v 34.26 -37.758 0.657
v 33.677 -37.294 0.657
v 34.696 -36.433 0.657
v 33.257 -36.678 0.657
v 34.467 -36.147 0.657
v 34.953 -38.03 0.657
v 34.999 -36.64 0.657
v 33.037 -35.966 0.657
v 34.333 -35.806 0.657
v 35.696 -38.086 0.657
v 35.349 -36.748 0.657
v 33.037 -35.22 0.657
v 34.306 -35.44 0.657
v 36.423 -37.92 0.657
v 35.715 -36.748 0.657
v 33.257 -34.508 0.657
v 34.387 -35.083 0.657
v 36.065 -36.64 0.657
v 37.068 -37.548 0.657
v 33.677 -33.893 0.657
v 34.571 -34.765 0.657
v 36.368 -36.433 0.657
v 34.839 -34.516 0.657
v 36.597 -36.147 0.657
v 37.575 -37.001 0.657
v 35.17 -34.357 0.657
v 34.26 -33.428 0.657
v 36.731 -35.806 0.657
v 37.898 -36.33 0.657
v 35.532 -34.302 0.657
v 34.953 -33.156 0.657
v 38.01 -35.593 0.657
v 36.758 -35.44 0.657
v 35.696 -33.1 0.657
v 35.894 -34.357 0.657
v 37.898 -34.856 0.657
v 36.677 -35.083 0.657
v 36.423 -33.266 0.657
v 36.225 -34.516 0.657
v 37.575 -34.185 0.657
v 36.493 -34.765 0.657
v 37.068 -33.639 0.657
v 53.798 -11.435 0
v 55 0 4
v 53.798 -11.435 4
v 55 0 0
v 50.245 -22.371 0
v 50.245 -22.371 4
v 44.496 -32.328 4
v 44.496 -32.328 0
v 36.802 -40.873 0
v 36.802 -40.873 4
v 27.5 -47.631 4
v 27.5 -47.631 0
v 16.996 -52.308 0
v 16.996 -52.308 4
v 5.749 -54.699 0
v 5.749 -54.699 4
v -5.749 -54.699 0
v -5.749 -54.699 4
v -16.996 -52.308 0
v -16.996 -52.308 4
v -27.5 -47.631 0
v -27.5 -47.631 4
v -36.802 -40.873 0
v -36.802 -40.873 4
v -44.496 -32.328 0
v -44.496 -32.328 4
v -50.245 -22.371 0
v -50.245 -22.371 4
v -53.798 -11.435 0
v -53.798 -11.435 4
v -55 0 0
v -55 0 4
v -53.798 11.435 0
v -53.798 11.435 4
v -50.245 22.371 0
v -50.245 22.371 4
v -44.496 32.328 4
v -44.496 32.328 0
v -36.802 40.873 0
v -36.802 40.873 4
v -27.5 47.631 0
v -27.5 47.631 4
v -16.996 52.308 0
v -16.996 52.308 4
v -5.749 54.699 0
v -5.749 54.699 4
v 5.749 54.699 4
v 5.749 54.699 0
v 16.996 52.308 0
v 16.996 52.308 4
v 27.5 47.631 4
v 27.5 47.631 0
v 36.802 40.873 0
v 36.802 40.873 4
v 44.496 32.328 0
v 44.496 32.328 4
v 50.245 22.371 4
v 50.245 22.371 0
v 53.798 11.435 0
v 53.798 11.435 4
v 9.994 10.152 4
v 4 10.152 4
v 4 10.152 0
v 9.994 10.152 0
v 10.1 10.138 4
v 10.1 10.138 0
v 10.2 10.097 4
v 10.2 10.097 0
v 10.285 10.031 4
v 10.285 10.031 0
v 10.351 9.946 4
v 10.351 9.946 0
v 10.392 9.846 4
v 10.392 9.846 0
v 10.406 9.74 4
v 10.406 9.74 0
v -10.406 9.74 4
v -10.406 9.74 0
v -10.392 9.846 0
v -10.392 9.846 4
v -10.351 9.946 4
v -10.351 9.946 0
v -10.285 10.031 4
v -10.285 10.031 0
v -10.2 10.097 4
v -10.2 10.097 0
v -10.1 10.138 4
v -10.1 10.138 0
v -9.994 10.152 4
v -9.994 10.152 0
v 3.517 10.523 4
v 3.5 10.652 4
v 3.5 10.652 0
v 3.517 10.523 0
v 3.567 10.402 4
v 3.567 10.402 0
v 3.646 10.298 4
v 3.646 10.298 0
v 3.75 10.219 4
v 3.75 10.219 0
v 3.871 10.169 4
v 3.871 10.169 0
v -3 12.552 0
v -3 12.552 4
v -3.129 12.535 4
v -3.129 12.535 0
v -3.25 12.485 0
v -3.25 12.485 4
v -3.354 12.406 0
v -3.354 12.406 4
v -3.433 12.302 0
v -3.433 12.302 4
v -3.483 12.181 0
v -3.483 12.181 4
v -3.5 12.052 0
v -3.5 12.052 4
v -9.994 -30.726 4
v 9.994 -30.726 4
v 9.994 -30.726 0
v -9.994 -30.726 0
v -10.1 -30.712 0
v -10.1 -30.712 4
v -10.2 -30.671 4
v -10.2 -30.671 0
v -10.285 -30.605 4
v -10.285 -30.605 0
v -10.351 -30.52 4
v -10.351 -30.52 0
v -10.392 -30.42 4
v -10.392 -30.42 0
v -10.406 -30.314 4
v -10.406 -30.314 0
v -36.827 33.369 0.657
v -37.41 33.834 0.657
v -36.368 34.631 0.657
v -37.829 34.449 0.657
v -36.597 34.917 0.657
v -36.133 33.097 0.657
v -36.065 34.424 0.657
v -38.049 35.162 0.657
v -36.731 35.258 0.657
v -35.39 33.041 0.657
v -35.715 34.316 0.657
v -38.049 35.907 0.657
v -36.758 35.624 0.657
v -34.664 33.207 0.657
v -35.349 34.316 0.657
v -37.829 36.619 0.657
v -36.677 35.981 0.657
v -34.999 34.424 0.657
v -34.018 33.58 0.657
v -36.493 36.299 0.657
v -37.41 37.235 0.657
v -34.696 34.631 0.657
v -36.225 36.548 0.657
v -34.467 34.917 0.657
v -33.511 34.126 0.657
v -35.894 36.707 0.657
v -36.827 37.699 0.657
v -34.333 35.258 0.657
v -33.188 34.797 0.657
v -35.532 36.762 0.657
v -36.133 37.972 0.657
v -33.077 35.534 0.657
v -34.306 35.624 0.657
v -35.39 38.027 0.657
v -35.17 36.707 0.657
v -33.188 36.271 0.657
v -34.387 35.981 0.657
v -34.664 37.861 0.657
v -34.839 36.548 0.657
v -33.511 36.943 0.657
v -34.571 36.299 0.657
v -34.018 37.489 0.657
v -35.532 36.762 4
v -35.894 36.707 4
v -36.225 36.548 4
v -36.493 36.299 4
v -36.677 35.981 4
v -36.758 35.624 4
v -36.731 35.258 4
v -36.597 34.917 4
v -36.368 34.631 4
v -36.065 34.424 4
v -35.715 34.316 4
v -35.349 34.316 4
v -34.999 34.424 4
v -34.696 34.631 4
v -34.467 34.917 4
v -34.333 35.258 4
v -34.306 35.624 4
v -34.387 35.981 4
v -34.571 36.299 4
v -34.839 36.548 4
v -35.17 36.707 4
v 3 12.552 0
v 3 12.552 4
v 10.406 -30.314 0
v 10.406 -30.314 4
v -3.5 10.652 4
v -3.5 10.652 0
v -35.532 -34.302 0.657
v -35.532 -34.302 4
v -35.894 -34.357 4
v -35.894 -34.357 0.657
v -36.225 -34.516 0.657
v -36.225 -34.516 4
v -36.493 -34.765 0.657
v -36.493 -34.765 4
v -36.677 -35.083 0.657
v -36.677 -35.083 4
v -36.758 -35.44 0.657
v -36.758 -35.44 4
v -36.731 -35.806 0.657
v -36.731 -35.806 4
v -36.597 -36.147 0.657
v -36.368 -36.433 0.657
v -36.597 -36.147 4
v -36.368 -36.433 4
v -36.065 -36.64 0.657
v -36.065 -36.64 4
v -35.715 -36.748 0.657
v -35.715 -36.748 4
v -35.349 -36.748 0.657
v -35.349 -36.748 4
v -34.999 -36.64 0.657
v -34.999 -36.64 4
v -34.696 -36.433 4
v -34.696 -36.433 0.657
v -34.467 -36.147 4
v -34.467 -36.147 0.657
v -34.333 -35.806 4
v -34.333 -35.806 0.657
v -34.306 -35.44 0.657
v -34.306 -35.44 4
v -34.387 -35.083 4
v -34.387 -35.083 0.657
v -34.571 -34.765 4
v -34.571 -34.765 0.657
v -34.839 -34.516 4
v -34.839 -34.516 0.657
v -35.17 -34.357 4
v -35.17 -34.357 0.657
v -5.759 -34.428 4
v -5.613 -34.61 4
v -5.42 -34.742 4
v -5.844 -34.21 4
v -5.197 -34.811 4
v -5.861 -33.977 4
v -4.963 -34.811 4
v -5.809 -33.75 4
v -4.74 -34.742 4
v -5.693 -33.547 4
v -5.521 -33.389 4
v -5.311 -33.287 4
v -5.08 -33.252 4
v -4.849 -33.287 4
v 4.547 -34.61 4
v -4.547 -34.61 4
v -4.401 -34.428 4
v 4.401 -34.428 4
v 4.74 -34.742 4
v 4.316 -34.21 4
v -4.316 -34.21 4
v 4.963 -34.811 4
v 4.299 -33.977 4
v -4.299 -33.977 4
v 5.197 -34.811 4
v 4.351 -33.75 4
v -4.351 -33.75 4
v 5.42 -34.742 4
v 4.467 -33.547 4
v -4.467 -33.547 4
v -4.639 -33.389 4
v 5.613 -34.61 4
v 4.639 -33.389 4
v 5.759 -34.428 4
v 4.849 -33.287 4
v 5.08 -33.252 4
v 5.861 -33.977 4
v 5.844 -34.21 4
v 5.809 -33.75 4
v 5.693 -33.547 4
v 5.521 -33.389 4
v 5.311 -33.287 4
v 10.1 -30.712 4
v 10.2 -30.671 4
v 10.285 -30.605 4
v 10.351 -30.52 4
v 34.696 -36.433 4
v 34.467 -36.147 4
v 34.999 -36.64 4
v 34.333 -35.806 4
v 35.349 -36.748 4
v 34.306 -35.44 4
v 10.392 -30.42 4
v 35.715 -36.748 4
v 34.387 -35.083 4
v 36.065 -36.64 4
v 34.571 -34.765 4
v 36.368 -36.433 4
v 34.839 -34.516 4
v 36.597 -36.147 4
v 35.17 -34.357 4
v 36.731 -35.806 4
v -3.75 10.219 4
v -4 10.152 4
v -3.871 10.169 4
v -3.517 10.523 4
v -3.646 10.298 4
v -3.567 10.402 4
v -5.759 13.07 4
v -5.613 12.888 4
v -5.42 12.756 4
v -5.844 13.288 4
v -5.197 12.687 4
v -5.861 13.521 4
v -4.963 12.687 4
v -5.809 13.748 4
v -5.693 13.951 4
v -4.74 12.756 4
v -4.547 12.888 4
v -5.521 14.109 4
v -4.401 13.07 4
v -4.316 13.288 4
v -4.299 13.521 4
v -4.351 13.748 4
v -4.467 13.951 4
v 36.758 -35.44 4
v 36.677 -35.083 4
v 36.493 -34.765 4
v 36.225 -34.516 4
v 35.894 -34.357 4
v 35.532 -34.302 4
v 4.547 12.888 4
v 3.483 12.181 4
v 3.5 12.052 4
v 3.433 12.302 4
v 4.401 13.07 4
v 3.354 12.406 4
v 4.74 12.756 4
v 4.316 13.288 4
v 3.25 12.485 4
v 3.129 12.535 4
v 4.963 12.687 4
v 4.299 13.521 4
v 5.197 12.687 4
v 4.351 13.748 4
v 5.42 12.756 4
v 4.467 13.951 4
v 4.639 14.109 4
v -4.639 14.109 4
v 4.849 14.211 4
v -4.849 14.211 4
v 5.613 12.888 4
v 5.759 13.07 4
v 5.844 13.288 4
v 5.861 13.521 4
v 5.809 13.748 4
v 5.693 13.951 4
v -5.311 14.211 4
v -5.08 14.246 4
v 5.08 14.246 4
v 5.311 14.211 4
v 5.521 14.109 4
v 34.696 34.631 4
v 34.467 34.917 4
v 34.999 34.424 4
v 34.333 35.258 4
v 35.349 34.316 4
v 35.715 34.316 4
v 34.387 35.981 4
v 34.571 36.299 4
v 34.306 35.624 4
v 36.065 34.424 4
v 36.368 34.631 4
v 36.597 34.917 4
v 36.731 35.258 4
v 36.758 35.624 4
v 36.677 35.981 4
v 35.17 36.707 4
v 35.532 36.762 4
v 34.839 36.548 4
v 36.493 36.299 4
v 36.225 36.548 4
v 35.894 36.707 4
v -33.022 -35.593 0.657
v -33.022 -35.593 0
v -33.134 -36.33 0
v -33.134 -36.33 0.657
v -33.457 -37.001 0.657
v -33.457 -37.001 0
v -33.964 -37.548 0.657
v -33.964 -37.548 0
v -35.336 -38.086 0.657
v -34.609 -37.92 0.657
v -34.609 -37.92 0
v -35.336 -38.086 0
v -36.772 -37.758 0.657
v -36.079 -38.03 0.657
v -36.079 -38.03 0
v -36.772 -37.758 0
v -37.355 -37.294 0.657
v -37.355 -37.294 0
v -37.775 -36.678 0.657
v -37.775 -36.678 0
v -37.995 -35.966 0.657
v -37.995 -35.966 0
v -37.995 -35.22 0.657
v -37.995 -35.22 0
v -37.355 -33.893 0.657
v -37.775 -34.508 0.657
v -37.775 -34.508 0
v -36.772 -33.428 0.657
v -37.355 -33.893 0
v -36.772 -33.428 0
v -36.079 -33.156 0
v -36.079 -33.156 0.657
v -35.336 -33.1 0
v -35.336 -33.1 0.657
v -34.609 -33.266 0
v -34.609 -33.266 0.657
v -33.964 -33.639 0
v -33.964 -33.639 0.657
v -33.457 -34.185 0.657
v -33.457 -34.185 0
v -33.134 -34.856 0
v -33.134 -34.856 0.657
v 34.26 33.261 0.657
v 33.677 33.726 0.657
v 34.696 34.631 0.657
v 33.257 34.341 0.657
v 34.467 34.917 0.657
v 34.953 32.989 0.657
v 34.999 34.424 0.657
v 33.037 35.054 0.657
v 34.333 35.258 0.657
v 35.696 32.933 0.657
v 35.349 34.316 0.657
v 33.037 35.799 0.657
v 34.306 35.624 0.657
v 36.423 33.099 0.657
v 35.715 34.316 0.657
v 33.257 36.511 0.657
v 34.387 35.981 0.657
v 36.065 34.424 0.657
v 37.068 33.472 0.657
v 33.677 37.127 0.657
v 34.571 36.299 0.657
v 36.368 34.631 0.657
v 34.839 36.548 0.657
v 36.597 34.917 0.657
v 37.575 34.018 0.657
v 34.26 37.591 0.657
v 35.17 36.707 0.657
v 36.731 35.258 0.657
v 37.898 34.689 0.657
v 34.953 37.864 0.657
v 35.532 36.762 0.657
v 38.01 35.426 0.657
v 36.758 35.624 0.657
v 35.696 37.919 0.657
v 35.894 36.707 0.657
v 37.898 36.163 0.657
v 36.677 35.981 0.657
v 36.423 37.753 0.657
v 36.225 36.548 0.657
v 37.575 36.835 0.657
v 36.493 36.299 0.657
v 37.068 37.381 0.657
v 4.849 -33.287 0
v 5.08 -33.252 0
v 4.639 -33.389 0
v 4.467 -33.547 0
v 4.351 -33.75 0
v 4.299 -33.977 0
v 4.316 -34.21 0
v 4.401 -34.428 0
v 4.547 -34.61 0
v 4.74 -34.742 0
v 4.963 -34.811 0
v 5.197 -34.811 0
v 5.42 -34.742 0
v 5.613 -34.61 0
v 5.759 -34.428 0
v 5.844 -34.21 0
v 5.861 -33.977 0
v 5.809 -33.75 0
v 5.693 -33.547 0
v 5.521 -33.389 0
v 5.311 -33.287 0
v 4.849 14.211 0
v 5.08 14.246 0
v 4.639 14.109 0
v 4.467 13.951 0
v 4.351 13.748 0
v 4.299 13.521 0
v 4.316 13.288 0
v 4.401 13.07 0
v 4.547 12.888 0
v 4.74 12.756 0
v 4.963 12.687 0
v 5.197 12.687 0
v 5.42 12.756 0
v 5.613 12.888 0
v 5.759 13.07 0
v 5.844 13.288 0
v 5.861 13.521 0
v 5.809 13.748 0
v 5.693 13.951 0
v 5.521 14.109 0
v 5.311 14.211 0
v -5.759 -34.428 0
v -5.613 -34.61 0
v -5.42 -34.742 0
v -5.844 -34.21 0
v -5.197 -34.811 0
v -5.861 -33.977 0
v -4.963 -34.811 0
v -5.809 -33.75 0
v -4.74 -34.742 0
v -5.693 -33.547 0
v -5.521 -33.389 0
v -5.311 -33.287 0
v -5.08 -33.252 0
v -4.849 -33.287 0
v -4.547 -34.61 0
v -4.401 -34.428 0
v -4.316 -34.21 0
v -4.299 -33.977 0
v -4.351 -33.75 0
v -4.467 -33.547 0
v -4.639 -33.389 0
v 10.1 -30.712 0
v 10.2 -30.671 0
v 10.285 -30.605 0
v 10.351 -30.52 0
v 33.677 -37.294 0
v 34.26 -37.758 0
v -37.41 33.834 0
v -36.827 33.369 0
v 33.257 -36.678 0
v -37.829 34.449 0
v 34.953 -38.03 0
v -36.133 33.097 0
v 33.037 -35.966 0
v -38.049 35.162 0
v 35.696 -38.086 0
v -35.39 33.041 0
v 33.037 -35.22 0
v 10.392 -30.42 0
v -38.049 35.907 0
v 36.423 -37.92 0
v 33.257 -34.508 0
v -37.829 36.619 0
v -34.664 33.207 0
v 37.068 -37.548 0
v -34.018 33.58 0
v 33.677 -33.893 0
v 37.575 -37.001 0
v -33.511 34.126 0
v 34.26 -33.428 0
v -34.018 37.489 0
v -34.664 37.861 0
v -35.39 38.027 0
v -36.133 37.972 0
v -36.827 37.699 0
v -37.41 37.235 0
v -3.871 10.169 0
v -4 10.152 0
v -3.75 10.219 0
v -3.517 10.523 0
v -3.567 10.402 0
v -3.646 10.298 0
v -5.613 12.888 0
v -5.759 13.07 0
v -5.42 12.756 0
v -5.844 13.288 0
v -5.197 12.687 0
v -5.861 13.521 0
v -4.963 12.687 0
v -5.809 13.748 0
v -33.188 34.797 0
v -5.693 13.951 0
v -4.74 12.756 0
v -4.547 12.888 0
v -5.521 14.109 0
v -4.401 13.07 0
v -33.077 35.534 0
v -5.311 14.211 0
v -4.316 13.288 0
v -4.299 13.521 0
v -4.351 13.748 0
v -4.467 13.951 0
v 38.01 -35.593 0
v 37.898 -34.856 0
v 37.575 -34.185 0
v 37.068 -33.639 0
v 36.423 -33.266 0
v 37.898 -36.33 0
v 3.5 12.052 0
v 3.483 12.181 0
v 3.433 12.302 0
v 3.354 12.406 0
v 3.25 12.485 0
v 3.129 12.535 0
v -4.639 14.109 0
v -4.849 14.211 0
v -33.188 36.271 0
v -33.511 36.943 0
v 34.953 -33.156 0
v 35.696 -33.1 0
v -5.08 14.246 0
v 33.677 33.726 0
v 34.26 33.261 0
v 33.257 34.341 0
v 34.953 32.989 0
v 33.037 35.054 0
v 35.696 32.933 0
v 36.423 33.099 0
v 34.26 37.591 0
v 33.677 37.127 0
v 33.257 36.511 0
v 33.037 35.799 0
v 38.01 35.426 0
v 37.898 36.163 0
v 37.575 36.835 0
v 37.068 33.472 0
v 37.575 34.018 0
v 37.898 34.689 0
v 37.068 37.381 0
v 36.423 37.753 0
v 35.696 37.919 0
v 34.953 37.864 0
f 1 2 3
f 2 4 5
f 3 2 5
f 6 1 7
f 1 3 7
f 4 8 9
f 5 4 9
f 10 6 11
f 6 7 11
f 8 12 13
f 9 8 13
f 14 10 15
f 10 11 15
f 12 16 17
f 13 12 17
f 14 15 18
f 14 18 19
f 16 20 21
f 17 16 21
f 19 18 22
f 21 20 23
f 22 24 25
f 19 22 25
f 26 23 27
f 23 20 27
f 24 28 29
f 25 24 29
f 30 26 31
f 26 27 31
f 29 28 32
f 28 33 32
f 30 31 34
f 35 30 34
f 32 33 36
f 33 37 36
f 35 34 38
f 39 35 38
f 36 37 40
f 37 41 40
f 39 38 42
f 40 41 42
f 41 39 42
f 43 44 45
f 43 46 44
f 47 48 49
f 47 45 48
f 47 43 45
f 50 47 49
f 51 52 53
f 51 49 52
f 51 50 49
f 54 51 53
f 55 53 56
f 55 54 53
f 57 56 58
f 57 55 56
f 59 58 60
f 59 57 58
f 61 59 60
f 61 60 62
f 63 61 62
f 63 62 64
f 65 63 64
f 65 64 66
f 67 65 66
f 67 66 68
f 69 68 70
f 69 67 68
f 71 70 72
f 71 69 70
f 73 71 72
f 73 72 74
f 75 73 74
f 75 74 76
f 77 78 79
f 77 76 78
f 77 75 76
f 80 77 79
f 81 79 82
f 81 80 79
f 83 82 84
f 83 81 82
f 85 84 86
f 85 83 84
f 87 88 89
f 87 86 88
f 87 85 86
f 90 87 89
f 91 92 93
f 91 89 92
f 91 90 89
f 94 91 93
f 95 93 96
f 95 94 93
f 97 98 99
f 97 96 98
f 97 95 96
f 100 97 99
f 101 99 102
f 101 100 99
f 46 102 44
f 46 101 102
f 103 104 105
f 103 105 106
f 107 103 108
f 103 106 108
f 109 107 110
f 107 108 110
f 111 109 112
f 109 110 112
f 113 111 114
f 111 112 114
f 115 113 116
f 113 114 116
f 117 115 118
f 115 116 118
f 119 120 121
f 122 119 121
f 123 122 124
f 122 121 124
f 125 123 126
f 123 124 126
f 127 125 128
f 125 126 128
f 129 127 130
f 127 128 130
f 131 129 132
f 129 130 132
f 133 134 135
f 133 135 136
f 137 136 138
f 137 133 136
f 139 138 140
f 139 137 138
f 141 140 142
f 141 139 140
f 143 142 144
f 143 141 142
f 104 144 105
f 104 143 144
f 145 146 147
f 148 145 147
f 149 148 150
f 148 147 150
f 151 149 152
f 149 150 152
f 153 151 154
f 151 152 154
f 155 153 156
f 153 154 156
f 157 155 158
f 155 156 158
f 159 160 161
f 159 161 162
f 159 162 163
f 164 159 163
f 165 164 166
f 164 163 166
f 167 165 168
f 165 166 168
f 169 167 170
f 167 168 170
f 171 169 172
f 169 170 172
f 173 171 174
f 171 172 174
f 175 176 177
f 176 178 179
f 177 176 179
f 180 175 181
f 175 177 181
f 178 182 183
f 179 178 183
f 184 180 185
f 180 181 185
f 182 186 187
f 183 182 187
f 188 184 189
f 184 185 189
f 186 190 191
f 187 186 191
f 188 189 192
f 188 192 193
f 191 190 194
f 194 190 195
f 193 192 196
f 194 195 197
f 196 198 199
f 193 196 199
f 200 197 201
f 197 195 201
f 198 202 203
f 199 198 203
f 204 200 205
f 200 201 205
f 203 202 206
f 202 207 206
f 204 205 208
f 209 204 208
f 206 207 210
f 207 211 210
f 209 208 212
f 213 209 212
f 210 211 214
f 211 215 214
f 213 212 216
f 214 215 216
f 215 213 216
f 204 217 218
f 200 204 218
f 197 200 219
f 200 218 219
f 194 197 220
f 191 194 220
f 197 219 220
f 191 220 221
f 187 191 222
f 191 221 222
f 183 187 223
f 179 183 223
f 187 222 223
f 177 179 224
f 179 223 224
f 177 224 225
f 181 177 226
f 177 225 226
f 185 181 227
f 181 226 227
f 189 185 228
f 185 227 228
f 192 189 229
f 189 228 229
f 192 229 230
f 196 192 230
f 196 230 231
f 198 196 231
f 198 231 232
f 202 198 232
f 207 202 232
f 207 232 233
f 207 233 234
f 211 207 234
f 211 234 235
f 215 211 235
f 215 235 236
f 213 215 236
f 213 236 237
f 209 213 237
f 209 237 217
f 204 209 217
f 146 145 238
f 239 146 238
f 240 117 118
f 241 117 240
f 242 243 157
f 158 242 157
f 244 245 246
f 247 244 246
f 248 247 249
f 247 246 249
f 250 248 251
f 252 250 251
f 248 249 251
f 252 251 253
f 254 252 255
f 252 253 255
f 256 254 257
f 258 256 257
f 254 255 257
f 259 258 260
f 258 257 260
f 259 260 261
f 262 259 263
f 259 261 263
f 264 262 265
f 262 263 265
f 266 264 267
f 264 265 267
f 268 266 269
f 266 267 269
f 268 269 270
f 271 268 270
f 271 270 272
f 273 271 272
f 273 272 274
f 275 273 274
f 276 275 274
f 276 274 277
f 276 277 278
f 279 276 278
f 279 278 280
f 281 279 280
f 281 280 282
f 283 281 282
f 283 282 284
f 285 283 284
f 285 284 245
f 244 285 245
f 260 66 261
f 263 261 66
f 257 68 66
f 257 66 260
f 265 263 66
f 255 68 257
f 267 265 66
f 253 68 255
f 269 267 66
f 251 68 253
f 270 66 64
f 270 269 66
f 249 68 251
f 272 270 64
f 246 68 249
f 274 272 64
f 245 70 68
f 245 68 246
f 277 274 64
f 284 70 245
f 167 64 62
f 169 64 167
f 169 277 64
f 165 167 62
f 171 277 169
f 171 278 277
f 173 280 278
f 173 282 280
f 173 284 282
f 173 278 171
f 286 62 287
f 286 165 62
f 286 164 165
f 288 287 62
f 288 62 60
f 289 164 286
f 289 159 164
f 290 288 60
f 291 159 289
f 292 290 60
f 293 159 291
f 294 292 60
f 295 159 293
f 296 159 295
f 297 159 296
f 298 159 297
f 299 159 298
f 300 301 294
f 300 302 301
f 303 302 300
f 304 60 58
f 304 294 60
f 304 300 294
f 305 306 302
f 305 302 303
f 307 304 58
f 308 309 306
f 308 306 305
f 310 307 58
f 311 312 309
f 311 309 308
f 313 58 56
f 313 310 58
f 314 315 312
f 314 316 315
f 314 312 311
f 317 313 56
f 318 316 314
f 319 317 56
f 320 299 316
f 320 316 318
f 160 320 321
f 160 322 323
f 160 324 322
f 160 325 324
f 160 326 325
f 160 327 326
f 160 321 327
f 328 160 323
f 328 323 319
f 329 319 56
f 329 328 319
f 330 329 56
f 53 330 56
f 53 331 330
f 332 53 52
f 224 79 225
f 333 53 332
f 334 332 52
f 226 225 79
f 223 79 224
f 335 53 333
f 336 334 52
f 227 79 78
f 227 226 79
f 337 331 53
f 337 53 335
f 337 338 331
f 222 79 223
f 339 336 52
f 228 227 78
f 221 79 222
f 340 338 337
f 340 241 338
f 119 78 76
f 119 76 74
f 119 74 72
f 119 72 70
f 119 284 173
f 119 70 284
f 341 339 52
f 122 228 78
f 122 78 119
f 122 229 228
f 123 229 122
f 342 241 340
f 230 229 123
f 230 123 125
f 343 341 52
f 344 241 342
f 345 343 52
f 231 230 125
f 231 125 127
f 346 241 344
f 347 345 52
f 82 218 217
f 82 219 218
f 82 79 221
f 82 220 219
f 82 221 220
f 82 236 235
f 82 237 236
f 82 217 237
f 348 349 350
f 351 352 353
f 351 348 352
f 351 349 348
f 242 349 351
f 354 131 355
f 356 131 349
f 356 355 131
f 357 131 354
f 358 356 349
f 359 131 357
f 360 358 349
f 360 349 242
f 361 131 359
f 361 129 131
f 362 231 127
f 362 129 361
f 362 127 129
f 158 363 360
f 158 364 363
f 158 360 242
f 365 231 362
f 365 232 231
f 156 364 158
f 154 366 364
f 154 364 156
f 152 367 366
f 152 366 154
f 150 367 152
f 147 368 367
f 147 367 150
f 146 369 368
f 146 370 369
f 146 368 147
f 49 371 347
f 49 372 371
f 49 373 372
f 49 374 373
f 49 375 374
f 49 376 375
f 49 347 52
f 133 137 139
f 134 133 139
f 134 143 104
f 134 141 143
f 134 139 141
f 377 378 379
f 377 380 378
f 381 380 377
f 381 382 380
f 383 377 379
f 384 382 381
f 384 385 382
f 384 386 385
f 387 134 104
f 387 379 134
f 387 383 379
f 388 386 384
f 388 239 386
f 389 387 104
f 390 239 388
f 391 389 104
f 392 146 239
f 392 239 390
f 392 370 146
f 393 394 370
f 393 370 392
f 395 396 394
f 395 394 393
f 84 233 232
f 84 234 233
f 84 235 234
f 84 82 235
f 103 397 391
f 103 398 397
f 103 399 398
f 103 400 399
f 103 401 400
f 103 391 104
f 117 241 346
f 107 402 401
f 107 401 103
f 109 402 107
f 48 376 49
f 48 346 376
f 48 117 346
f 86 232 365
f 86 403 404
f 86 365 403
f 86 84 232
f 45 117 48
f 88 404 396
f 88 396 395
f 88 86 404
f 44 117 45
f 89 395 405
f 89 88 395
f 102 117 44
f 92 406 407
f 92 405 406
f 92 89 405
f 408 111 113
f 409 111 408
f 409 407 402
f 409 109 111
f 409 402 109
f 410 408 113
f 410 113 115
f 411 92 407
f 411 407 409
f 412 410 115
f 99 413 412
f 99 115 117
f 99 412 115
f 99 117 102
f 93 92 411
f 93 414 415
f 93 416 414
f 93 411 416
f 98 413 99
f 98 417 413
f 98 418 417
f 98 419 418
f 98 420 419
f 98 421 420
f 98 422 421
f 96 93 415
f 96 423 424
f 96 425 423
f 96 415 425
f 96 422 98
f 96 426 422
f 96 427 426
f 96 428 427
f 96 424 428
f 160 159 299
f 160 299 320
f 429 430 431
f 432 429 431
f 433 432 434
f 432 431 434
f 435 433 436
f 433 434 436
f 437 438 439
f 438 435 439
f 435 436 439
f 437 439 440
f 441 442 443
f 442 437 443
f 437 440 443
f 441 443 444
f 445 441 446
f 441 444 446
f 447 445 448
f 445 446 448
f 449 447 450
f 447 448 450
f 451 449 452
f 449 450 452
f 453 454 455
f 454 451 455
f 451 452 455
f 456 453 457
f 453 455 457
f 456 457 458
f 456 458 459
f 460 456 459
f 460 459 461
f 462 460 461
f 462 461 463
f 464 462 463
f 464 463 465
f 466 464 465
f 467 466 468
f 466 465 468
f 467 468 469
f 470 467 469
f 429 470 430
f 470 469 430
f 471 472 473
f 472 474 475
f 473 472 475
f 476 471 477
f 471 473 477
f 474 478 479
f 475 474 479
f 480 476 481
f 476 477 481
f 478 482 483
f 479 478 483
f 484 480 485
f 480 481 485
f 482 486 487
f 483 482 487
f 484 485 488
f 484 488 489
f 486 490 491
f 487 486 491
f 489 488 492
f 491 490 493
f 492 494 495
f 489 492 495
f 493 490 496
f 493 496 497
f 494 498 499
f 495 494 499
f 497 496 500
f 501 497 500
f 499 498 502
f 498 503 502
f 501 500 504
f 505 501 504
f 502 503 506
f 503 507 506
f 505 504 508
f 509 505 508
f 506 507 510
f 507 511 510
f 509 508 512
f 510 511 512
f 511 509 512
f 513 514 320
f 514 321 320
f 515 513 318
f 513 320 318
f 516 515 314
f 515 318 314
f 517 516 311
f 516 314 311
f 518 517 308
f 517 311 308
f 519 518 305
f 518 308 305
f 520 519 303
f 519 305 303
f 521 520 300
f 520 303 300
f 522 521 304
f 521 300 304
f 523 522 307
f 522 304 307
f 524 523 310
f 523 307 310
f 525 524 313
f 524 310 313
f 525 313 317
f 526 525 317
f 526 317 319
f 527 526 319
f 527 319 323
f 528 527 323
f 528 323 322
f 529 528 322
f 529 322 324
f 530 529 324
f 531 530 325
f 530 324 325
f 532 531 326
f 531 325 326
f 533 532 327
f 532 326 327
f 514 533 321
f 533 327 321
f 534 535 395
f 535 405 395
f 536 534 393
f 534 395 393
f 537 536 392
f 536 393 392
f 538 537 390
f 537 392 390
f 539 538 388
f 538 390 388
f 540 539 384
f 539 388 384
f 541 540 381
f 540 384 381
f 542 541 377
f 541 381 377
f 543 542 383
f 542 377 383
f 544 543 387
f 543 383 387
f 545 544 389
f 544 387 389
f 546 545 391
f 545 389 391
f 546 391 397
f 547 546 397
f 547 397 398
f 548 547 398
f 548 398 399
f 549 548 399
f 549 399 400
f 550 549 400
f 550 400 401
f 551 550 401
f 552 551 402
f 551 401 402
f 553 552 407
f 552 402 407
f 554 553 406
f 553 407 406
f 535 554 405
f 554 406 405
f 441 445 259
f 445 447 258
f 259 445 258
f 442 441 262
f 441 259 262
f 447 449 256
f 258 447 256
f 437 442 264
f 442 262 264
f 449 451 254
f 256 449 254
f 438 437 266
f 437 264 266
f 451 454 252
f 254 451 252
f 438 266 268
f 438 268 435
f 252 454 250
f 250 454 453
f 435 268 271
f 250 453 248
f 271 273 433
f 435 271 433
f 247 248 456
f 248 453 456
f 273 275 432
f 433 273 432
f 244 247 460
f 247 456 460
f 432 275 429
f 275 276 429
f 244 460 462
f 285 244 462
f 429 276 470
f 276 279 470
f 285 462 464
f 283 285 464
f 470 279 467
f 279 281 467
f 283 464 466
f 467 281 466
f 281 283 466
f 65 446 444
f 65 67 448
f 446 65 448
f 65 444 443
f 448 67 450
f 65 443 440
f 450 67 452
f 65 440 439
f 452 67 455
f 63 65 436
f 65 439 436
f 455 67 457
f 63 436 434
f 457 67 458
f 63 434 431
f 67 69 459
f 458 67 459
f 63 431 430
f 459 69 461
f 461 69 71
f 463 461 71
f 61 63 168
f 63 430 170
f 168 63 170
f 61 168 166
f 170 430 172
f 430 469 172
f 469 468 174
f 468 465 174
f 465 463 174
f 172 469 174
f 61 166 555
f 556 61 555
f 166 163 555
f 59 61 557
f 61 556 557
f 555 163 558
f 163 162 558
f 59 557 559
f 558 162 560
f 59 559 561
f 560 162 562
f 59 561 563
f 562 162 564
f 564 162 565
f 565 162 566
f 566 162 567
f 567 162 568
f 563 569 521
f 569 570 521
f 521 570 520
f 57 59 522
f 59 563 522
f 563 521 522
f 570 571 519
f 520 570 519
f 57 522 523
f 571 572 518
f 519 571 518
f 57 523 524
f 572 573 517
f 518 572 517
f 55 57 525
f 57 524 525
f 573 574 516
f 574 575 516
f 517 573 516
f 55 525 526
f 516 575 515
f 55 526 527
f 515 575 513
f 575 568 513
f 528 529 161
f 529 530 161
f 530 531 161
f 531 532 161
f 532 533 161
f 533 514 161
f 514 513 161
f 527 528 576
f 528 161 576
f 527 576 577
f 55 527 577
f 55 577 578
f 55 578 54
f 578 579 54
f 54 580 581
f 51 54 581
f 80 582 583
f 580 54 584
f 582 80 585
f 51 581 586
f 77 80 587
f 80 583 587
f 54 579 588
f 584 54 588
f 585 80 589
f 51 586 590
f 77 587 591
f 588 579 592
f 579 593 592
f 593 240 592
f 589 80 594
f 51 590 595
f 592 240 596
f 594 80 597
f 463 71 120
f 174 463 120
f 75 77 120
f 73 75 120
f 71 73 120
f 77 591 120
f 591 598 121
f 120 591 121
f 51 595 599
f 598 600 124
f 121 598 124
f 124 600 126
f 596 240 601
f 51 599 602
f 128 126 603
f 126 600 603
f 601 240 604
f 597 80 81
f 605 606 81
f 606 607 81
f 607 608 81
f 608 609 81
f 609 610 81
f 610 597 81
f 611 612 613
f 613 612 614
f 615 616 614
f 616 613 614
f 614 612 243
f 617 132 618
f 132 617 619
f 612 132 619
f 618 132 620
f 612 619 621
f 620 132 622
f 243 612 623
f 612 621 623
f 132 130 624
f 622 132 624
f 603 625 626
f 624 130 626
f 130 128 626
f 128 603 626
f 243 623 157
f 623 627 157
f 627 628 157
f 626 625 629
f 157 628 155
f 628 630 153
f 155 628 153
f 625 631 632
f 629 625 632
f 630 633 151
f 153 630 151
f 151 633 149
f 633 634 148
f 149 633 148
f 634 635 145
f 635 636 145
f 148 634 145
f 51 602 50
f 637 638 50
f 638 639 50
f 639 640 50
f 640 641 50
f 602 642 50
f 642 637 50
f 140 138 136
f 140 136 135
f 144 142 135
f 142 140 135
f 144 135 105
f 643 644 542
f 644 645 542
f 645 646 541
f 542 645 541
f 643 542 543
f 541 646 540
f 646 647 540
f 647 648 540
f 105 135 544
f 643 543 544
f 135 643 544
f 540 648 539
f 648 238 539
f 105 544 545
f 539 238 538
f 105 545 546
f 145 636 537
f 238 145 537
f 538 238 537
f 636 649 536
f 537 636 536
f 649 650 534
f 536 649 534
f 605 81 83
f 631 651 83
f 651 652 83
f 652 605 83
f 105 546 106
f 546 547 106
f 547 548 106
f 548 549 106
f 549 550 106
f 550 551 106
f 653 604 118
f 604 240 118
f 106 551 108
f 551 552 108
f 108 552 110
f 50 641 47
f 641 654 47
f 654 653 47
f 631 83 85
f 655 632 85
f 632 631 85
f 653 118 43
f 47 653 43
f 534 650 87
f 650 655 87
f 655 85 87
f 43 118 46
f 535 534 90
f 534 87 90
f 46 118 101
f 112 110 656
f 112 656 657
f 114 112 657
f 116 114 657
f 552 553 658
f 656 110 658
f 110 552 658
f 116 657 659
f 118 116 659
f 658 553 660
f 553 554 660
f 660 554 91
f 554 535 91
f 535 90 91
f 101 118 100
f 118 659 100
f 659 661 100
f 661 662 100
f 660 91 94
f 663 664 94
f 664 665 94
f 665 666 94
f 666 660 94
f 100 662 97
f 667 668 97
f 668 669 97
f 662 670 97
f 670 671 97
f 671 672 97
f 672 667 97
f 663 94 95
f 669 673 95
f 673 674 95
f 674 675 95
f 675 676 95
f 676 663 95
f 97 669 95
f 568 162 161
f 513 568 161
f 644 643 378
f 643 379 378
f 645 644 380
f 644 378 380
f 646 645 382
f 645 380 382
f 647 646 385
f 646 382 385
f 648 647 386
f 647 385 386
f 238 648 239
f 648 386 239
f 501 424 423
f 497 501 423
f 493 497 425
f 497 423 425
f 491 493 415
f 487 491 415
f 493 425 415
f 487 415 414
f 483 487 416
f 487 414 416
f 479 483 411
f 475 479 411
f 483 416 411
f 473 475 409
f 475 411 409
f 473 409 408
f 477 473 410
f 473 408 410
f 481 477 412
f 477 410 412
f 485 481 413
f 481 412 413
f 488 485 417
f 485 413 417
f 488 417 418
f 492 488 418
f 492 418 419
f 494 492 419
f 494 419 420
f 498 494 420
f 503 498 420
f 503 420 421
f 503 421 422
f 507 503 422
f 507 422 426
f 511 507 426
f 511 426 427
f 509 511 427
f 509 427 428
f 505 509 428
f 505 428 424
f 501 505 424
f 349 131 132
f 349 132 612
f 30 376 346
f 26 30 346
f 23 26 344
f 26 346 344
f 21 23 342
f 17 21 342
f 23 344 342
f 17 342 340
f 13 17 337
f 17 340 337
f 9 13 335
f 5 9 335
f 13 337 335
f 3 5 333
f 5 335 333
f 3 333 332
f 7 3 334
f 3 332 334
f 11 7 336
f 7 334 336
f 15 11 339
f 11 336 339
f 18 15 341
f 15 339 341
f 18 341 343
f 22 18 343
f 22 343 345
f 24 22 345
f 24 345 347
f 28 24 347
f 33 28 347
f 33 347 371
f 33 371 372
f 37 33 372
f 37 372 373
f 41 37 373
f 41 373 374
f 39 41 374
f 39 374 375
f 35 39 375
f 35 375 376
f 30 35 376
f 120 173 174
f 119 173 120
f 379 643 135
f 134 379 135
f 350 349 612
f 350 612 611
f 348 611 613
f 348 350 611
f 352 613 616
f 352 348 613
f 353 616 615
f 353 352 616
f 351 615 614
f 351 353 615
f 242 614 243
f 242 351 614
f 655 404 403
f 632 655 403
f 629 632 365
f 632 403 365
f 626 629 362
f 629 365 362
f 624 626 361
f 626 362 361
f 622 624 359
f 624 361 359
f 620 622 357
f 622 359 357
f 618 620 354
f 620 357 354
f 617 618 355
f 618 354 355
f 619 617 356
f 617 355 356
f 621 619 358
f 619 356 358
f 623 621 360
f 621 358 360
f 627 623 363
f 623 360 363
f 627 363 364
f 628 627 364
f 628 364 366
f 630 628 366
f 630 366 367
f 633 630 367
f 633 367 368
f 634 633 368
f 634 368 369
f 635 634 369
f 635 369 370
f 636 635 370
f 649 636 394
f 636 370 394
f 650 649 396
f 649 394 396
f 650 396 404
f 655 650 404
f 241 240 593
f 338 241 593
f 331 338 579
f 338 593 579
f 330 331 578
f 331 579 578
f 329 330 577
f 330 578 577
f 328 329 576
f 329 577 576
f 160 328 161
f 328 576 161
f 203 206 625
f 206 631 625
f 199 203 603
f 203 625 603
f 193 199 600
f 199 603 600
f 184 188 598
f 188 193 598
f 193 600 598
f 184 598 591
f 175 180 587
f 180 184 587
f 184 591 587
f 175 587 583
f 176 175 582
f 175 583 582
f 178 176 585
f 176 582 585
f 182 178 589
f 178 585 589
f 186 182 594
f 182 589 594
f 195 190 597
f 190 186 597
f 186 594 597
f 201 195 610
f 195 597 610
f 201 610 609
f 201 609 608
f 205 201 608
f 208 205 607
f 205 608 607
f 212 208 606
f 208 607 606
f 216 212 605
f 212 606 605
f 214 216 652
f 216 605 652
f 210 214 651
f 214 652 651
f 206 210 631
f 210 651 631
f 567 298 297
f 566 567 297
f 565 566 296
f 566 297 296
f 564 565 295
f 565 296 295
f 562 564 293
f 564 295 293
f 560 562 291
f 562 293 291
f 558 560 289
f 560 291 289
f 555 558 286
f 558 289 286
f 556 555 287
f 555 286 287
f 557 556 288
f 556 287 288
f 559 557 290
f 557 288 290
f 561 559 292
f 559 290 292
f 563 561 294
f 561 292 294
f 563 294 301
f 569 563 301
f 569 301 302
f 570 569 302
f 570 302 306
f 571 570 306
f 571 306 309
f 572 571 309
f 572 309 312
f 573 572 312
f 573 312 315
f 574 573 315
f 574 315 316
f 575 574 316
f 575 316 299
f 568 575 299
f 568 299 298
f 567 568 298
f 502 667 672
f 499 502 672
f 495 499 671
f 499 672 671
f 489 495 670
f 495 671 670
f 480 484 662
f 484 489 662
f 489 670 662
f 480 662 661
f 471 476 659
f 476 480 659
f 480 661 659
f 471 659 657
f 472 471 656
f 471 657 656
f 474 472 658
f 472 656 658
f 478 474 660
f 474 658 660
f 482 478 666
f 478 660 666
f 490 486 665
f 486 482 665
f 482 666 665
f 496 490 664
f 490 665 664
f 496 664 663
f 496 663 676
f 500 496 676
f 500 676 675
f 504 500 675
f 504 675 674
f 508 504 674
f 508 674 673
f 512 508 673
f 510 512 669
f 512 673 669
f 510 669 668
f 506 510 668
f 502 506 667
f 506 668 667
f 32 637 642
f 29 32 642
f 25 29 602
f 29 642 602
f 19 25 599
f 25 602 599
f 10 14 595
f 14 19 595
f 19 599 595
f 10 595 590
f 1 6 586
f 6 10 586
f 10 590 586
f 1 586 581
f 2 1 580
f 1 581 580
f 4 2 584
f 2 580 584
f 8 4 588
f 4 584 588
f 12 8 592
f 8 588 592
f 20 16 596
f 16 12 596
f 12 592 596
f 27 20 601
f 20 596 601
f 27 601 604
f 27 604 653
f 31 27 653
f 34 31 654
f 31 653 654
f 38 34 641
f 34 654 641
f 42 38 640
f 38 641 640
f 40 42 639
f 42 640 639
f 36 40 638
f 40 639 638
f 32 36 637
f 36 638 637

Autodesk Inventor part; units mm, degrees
sketch "Sketch1" plane through (0, 0, 0) normal (0, 0, 1) x (1, 0, 0)
  circle A0 centre (0, 0) radius 55
  dimension "d0" = 110
extrude "Extrusion1" add sketch "Sketch1" along normal blind 4
ref_plane "Work Plane1" through (0, 0, 4) normal (0, 0, 1) x (1, 0, 0)
sketch "Sketch2" plane through (0, 0, 4) normal (0, 0, 1) x (1, 0, 0)
  line L0 (-10.406, 10.152) -> (10.406, 10.152)
  line L1 (10.406, 10.152) -> (10.406, -30.726)
  line L2 (10.406, -30.726) -> (-10.406, -30.726)
  line L3 (-10.406, -30.726) -> (-10.406, 10.152)
  circle A0 centre (-35.532, 35.532) radius 1.5
  circle A1 centre (-35.532, -35.532) radius 1.5
  circle A2 centre (35.532, -35.532) radius 1.5
  circle A3 centre (35.532, 35.532) radius 1.5
  circle A4 centre (-5.08, 13.462) radius 1
  circle A5 centre (5.08, 13.462) radius 1
  circle A6 centre (-5.08, -34.036) radius 1
  circle A7 centre (5.08, -34.036) radius 1
  point P0 (0, 0)
  point P1 (0, 10.152)
  point P2 (0, -30.726)
  dimension "d78" = 30.226
  dimension "d80" = 5.08
  dimension "d82" = 5.08
  dimension "d4" = 20.812
  dimension "d5" = 40.878
  dimension "d6" = 10.152
  dimension "d7" = 3
  dimension "d8" = 3
  dimension "d9" = 3
  dimension "d10" = 3
  dimension "d11" = 2
  dimension "d12" = 2
  dimension "d13" = 2
  dimension "d14" = 2
  dimension "d15" = 35.532
  dimension "d16" = 35.532
  dimension "d17" = 35.532
  dimension "d18" = 35.532
  dimension "d19" = 35.532
  dimension "d20" = 35.532
  dimension "d21" = 35.532
  dimension "d22" = 35.532
  dimension "d23" = 10.16
  dimension "d24" = 10.16
  dimension "d25" = 3.31
  dimension "d26" = 3.31
  dimension "d27" = 3.31
  dimension "d28" = 3.31
  dimension "d47" = 30.726
  dimension "d48" = 5.08
  dimension "d49" = 5.08
  dimension "d50" = 5.08
  dimension "d51" = 5.08
  dimension "d137" = 10.152
extrude "Extrusion2" cut sketch "Sketch2" against normal blind 4 contours L0 L1 L2 L3
ref_plane "Work Plane2" through (0, 0, 4) normal (0, 0, 1) x (1, 0, 0)
sketch "Sketch3" plane through (0, 0, 4) normal (0, 0, 1) x (1, 0, 0)
  circle A0 centre (-35.577, 35.5342) radius 2.5
  circle A1 centre (-35.5225, -35.5931) radius 2.5
  circle A2 centre (35.5095, -35.5931) radius 2.5
  circle A3 centre (35.5095, 35.4262) radius 2.5
  point P0 (0, 0)
ref_plane "Work Plane3" through (0, 0, 0) normal (0, 0, 1) x (1, 0, 0)
sketch "Sketch4" plane through (0, 0, 0) normal (0, 0, 1) x (1, 0, 0)
  circle A0 centre (-35.577, 35.5342) radius 2.5
  circle A1 centre (-35.5225, -35.5931) radius 2.5
  circle A2 centre (35.5095, -35.5931) radius 2.5
  circle A3 centre (35.5095, 35.4262) radius 2.5
  point P0 (0, 0)
  point P1 (0, 0)
  dimension "d41" = 5
  dimension "d42" = 5
  dimension "d43" = 5
  dimension "d44" = 5
extrude "Extrusion3" cut sketch "Sketch4" along normal blind 0.657
ref_plane "Work Plane4" through (0, 0, 0) normal (0, 0, -1) x (-1, 0, 0)
sketch "Sketch5" plane through (0, 0, 0) normal (0, 0, -1) x (-1, 0, 0)
  line L0 (-9.906, 9.652) -> (9.906, 9.652)
  line L1 (9.906, 9.652) -> (9.906, -30.226)
  line L2 (9.906, -30.226) -> (-9.906, -30.226)
  line L3 (-9.906, -30.226) -> (-9.906, 9.652)
  circle A0 centre (-35.532, 35.532) radius 1.5
  circle A1 centre (-35.532, -35.532) radius 1.5
  circle A2 centre (35.532, -35.532) radius 1.5
  circle A3 centre (35.532, 35.532) radius 1.5
  circle A4 centre (-5.08, 13.462) radius 1
  circle A5 centre (5.08, 13.462) radius 1
  circle A6 centre (-5.08, -34.036) radius 1
  circle A7 centre (5.08, -34.036) radius 1
  point P0 (0, 0)
  point P1 (0, 0)
  point P2 (0, 9.652)
  point P3 (0, -30.226)
  dimension "d53" = 19.812
  dimension "d54" = 39.878
  dimension "d55" = 9.652
  dimension "d56" = 3
  dimension "d57" = 3
  dimension "d58" = 3
  dimension "d59" = 3
  dimension "d60" = 2
  dimension "d61" = 2
  dimension "d62" = 2
  dimension "d63" = 2
  dimension "d64" = 35.532
  dimension "d65" = 35.532
  dimension "d66" = 35.532
  dimension "d67" = 35.532
  dimension "d68" = 35.532
  dimension "d69" = 35.532
  dimension "d70" = 35.532
  dimension "d71" = 35.532
  dimension "d72" = 10.16
  dimension "d73" = 10.16
  dimension "d74" = 3.81
  dimension "d75" = 3.81
  dimension "d76" = 3.81
  dimension "d77" = 3.81
  dimension "d78" = 30.226
  dimension "d79" = 5.08
  dimension "d80" = 5.08
  dimension "d81" = 5.08
  dimension "d82" = 5.08
hole "Hole1" at (35.532, 35.532, 0) at (-35.532, 35.532, 0) at (35.532, -35.532, 0) at (-35.532, -35.532, 0) direction (0, 0, 1) diameter 2.459 depth 4 tip angle 118 thread size "M3x0.5" class "6H" standard "ANSI Metric M Profile"
ref_plane "Work Plane5" through (0, 0, 0) normal (0, 0, -1) x (-1, 0, 0)
sketch "Sketch6" plane through (0, 0, 0) normal (0, 0, -1) x (-1, 0, 0)
  line L0 (-9.906, 9.652) -> (9.906, 9.652)
  line L1 (9.906, 9.652) -> (9.906, -30.226)
  line L2 (9.906, -30.226) -> (-9.906, -30.226)
  line L3 (-9.906, -30.226) -> (-9.906, 9.652)
  circle A0 centre (-35.532, 35.532) radius 1.5
  circle A1 centre (-35.532, -35.532) radius 1.5
  circle A2 centre (35.532, -35.532) radius 1.5
  circle A3 centre (35.532, 35.532) radius 1.5
  circle A4 centre (-5.08, 13.462) radius 1
  circle A5 centre (5.08, 13.462) radius 1
  circle A6 centre (-5.08, -34.036) radius 1
  circle A7 centre (5.08, -34.036) radius 1
  point P0 (0, 0)
  point P1 (0, 0)
  point P2 (0, 0)
  point P3 (0, 9.652)
  point P4 (0, -30.226)
  dimension "d91" = 19.812
  dimension "d92" = 39.878
  dimension "d93" = 9.652
  dimension "d94" = 3
  dimension "d95" = 3
  dimension "d96" = 3
  dimension "d97" = 3
  dimension "d98" = 2
  dimension "d99" = 2
  dimension "d100" = 2
  dimension "d101" = 2
  dimension "d102" = 35.532
  dimension "d103" = 35.532
  dimension "d104" = 35.532
  dimension "d105" = 35.532
  dimension "d106" = 35.532
  dimension "d107" = 35.532
  dimension "d108" = 35.532
  dimension "d109" = 35.532
  dimension "d110" = 10.16
  dimension "d111" = 10.16
  dimension "d112" = 3.81
  dimension "d113" = 3.81
  dimension "d114" = 3.81
  dimension "d115" = 3.81
  dimension "d116" = 30.226
  dimension "d117" = 5.08
  dimension "d118" = 5.08
  dimension "d119" = 5.08
  dimension "d120" = 5.08
hole "Hole2" at (-5.08, 13.462, 0) at (5.08, 13.462, 0) at (-5.08, -34.036, 0) at (5.08, -34.036, 0) direction (0, 0, 1) diameter 1.567 depth 4 tip angle 118 thread size "M2x0.4" class "6H" standard "ANSI Metric M Profile"
fillet "Fillet1" radius 0.4125 4 edges at (10.406, -30.726, 2) (-10.406, -30.726, 2) (10.406, 10.152, 2) (-10.406, 10.152, 2)
ref_plane "Work Plane6" through (0, 0, 0) normal (0, 0, -1) x (-1, 0, 0)
sketch "Sketch7" plane through (0, 0, 0) normal (0, 0, -1) x (-1, 0, 0)
  line L0 (3.5, 12.552) -> (-3.5, 12.552)
  line L1 (-3.5, 12.552) -> (-3.5, 10.052)
  line L2 (-3.5, 10.052) -> (3.5, 10.052)
  line L3 (3.5, 10.052) -> (3.5, 12.552)
  line L4 (-9.9935, 10.152) -> (9.9935, 10.152) projected
  point P0 (0, 0)
  point P1 (-3.5, 10.152)
  point P2 (3.5, 10.152)
  dimension "d130" = 2.5
  dimension "d131" = 7
  dimension "d132" = 0.1
  dimension "d133" = 3.5
extrude "Extrusion4" cut sketch "Sketch7" against normal blind 4 contours L3 L4 L1 L0
fillet "Fillet2" radius 0.5 4 edges at (-3.5, 12.552, 2) (-3.5, 10.152, 2) (3.5, 12.552, 2) (3.5, 10.152, 2)
properties part number "bottom-plate_3DPrint"
